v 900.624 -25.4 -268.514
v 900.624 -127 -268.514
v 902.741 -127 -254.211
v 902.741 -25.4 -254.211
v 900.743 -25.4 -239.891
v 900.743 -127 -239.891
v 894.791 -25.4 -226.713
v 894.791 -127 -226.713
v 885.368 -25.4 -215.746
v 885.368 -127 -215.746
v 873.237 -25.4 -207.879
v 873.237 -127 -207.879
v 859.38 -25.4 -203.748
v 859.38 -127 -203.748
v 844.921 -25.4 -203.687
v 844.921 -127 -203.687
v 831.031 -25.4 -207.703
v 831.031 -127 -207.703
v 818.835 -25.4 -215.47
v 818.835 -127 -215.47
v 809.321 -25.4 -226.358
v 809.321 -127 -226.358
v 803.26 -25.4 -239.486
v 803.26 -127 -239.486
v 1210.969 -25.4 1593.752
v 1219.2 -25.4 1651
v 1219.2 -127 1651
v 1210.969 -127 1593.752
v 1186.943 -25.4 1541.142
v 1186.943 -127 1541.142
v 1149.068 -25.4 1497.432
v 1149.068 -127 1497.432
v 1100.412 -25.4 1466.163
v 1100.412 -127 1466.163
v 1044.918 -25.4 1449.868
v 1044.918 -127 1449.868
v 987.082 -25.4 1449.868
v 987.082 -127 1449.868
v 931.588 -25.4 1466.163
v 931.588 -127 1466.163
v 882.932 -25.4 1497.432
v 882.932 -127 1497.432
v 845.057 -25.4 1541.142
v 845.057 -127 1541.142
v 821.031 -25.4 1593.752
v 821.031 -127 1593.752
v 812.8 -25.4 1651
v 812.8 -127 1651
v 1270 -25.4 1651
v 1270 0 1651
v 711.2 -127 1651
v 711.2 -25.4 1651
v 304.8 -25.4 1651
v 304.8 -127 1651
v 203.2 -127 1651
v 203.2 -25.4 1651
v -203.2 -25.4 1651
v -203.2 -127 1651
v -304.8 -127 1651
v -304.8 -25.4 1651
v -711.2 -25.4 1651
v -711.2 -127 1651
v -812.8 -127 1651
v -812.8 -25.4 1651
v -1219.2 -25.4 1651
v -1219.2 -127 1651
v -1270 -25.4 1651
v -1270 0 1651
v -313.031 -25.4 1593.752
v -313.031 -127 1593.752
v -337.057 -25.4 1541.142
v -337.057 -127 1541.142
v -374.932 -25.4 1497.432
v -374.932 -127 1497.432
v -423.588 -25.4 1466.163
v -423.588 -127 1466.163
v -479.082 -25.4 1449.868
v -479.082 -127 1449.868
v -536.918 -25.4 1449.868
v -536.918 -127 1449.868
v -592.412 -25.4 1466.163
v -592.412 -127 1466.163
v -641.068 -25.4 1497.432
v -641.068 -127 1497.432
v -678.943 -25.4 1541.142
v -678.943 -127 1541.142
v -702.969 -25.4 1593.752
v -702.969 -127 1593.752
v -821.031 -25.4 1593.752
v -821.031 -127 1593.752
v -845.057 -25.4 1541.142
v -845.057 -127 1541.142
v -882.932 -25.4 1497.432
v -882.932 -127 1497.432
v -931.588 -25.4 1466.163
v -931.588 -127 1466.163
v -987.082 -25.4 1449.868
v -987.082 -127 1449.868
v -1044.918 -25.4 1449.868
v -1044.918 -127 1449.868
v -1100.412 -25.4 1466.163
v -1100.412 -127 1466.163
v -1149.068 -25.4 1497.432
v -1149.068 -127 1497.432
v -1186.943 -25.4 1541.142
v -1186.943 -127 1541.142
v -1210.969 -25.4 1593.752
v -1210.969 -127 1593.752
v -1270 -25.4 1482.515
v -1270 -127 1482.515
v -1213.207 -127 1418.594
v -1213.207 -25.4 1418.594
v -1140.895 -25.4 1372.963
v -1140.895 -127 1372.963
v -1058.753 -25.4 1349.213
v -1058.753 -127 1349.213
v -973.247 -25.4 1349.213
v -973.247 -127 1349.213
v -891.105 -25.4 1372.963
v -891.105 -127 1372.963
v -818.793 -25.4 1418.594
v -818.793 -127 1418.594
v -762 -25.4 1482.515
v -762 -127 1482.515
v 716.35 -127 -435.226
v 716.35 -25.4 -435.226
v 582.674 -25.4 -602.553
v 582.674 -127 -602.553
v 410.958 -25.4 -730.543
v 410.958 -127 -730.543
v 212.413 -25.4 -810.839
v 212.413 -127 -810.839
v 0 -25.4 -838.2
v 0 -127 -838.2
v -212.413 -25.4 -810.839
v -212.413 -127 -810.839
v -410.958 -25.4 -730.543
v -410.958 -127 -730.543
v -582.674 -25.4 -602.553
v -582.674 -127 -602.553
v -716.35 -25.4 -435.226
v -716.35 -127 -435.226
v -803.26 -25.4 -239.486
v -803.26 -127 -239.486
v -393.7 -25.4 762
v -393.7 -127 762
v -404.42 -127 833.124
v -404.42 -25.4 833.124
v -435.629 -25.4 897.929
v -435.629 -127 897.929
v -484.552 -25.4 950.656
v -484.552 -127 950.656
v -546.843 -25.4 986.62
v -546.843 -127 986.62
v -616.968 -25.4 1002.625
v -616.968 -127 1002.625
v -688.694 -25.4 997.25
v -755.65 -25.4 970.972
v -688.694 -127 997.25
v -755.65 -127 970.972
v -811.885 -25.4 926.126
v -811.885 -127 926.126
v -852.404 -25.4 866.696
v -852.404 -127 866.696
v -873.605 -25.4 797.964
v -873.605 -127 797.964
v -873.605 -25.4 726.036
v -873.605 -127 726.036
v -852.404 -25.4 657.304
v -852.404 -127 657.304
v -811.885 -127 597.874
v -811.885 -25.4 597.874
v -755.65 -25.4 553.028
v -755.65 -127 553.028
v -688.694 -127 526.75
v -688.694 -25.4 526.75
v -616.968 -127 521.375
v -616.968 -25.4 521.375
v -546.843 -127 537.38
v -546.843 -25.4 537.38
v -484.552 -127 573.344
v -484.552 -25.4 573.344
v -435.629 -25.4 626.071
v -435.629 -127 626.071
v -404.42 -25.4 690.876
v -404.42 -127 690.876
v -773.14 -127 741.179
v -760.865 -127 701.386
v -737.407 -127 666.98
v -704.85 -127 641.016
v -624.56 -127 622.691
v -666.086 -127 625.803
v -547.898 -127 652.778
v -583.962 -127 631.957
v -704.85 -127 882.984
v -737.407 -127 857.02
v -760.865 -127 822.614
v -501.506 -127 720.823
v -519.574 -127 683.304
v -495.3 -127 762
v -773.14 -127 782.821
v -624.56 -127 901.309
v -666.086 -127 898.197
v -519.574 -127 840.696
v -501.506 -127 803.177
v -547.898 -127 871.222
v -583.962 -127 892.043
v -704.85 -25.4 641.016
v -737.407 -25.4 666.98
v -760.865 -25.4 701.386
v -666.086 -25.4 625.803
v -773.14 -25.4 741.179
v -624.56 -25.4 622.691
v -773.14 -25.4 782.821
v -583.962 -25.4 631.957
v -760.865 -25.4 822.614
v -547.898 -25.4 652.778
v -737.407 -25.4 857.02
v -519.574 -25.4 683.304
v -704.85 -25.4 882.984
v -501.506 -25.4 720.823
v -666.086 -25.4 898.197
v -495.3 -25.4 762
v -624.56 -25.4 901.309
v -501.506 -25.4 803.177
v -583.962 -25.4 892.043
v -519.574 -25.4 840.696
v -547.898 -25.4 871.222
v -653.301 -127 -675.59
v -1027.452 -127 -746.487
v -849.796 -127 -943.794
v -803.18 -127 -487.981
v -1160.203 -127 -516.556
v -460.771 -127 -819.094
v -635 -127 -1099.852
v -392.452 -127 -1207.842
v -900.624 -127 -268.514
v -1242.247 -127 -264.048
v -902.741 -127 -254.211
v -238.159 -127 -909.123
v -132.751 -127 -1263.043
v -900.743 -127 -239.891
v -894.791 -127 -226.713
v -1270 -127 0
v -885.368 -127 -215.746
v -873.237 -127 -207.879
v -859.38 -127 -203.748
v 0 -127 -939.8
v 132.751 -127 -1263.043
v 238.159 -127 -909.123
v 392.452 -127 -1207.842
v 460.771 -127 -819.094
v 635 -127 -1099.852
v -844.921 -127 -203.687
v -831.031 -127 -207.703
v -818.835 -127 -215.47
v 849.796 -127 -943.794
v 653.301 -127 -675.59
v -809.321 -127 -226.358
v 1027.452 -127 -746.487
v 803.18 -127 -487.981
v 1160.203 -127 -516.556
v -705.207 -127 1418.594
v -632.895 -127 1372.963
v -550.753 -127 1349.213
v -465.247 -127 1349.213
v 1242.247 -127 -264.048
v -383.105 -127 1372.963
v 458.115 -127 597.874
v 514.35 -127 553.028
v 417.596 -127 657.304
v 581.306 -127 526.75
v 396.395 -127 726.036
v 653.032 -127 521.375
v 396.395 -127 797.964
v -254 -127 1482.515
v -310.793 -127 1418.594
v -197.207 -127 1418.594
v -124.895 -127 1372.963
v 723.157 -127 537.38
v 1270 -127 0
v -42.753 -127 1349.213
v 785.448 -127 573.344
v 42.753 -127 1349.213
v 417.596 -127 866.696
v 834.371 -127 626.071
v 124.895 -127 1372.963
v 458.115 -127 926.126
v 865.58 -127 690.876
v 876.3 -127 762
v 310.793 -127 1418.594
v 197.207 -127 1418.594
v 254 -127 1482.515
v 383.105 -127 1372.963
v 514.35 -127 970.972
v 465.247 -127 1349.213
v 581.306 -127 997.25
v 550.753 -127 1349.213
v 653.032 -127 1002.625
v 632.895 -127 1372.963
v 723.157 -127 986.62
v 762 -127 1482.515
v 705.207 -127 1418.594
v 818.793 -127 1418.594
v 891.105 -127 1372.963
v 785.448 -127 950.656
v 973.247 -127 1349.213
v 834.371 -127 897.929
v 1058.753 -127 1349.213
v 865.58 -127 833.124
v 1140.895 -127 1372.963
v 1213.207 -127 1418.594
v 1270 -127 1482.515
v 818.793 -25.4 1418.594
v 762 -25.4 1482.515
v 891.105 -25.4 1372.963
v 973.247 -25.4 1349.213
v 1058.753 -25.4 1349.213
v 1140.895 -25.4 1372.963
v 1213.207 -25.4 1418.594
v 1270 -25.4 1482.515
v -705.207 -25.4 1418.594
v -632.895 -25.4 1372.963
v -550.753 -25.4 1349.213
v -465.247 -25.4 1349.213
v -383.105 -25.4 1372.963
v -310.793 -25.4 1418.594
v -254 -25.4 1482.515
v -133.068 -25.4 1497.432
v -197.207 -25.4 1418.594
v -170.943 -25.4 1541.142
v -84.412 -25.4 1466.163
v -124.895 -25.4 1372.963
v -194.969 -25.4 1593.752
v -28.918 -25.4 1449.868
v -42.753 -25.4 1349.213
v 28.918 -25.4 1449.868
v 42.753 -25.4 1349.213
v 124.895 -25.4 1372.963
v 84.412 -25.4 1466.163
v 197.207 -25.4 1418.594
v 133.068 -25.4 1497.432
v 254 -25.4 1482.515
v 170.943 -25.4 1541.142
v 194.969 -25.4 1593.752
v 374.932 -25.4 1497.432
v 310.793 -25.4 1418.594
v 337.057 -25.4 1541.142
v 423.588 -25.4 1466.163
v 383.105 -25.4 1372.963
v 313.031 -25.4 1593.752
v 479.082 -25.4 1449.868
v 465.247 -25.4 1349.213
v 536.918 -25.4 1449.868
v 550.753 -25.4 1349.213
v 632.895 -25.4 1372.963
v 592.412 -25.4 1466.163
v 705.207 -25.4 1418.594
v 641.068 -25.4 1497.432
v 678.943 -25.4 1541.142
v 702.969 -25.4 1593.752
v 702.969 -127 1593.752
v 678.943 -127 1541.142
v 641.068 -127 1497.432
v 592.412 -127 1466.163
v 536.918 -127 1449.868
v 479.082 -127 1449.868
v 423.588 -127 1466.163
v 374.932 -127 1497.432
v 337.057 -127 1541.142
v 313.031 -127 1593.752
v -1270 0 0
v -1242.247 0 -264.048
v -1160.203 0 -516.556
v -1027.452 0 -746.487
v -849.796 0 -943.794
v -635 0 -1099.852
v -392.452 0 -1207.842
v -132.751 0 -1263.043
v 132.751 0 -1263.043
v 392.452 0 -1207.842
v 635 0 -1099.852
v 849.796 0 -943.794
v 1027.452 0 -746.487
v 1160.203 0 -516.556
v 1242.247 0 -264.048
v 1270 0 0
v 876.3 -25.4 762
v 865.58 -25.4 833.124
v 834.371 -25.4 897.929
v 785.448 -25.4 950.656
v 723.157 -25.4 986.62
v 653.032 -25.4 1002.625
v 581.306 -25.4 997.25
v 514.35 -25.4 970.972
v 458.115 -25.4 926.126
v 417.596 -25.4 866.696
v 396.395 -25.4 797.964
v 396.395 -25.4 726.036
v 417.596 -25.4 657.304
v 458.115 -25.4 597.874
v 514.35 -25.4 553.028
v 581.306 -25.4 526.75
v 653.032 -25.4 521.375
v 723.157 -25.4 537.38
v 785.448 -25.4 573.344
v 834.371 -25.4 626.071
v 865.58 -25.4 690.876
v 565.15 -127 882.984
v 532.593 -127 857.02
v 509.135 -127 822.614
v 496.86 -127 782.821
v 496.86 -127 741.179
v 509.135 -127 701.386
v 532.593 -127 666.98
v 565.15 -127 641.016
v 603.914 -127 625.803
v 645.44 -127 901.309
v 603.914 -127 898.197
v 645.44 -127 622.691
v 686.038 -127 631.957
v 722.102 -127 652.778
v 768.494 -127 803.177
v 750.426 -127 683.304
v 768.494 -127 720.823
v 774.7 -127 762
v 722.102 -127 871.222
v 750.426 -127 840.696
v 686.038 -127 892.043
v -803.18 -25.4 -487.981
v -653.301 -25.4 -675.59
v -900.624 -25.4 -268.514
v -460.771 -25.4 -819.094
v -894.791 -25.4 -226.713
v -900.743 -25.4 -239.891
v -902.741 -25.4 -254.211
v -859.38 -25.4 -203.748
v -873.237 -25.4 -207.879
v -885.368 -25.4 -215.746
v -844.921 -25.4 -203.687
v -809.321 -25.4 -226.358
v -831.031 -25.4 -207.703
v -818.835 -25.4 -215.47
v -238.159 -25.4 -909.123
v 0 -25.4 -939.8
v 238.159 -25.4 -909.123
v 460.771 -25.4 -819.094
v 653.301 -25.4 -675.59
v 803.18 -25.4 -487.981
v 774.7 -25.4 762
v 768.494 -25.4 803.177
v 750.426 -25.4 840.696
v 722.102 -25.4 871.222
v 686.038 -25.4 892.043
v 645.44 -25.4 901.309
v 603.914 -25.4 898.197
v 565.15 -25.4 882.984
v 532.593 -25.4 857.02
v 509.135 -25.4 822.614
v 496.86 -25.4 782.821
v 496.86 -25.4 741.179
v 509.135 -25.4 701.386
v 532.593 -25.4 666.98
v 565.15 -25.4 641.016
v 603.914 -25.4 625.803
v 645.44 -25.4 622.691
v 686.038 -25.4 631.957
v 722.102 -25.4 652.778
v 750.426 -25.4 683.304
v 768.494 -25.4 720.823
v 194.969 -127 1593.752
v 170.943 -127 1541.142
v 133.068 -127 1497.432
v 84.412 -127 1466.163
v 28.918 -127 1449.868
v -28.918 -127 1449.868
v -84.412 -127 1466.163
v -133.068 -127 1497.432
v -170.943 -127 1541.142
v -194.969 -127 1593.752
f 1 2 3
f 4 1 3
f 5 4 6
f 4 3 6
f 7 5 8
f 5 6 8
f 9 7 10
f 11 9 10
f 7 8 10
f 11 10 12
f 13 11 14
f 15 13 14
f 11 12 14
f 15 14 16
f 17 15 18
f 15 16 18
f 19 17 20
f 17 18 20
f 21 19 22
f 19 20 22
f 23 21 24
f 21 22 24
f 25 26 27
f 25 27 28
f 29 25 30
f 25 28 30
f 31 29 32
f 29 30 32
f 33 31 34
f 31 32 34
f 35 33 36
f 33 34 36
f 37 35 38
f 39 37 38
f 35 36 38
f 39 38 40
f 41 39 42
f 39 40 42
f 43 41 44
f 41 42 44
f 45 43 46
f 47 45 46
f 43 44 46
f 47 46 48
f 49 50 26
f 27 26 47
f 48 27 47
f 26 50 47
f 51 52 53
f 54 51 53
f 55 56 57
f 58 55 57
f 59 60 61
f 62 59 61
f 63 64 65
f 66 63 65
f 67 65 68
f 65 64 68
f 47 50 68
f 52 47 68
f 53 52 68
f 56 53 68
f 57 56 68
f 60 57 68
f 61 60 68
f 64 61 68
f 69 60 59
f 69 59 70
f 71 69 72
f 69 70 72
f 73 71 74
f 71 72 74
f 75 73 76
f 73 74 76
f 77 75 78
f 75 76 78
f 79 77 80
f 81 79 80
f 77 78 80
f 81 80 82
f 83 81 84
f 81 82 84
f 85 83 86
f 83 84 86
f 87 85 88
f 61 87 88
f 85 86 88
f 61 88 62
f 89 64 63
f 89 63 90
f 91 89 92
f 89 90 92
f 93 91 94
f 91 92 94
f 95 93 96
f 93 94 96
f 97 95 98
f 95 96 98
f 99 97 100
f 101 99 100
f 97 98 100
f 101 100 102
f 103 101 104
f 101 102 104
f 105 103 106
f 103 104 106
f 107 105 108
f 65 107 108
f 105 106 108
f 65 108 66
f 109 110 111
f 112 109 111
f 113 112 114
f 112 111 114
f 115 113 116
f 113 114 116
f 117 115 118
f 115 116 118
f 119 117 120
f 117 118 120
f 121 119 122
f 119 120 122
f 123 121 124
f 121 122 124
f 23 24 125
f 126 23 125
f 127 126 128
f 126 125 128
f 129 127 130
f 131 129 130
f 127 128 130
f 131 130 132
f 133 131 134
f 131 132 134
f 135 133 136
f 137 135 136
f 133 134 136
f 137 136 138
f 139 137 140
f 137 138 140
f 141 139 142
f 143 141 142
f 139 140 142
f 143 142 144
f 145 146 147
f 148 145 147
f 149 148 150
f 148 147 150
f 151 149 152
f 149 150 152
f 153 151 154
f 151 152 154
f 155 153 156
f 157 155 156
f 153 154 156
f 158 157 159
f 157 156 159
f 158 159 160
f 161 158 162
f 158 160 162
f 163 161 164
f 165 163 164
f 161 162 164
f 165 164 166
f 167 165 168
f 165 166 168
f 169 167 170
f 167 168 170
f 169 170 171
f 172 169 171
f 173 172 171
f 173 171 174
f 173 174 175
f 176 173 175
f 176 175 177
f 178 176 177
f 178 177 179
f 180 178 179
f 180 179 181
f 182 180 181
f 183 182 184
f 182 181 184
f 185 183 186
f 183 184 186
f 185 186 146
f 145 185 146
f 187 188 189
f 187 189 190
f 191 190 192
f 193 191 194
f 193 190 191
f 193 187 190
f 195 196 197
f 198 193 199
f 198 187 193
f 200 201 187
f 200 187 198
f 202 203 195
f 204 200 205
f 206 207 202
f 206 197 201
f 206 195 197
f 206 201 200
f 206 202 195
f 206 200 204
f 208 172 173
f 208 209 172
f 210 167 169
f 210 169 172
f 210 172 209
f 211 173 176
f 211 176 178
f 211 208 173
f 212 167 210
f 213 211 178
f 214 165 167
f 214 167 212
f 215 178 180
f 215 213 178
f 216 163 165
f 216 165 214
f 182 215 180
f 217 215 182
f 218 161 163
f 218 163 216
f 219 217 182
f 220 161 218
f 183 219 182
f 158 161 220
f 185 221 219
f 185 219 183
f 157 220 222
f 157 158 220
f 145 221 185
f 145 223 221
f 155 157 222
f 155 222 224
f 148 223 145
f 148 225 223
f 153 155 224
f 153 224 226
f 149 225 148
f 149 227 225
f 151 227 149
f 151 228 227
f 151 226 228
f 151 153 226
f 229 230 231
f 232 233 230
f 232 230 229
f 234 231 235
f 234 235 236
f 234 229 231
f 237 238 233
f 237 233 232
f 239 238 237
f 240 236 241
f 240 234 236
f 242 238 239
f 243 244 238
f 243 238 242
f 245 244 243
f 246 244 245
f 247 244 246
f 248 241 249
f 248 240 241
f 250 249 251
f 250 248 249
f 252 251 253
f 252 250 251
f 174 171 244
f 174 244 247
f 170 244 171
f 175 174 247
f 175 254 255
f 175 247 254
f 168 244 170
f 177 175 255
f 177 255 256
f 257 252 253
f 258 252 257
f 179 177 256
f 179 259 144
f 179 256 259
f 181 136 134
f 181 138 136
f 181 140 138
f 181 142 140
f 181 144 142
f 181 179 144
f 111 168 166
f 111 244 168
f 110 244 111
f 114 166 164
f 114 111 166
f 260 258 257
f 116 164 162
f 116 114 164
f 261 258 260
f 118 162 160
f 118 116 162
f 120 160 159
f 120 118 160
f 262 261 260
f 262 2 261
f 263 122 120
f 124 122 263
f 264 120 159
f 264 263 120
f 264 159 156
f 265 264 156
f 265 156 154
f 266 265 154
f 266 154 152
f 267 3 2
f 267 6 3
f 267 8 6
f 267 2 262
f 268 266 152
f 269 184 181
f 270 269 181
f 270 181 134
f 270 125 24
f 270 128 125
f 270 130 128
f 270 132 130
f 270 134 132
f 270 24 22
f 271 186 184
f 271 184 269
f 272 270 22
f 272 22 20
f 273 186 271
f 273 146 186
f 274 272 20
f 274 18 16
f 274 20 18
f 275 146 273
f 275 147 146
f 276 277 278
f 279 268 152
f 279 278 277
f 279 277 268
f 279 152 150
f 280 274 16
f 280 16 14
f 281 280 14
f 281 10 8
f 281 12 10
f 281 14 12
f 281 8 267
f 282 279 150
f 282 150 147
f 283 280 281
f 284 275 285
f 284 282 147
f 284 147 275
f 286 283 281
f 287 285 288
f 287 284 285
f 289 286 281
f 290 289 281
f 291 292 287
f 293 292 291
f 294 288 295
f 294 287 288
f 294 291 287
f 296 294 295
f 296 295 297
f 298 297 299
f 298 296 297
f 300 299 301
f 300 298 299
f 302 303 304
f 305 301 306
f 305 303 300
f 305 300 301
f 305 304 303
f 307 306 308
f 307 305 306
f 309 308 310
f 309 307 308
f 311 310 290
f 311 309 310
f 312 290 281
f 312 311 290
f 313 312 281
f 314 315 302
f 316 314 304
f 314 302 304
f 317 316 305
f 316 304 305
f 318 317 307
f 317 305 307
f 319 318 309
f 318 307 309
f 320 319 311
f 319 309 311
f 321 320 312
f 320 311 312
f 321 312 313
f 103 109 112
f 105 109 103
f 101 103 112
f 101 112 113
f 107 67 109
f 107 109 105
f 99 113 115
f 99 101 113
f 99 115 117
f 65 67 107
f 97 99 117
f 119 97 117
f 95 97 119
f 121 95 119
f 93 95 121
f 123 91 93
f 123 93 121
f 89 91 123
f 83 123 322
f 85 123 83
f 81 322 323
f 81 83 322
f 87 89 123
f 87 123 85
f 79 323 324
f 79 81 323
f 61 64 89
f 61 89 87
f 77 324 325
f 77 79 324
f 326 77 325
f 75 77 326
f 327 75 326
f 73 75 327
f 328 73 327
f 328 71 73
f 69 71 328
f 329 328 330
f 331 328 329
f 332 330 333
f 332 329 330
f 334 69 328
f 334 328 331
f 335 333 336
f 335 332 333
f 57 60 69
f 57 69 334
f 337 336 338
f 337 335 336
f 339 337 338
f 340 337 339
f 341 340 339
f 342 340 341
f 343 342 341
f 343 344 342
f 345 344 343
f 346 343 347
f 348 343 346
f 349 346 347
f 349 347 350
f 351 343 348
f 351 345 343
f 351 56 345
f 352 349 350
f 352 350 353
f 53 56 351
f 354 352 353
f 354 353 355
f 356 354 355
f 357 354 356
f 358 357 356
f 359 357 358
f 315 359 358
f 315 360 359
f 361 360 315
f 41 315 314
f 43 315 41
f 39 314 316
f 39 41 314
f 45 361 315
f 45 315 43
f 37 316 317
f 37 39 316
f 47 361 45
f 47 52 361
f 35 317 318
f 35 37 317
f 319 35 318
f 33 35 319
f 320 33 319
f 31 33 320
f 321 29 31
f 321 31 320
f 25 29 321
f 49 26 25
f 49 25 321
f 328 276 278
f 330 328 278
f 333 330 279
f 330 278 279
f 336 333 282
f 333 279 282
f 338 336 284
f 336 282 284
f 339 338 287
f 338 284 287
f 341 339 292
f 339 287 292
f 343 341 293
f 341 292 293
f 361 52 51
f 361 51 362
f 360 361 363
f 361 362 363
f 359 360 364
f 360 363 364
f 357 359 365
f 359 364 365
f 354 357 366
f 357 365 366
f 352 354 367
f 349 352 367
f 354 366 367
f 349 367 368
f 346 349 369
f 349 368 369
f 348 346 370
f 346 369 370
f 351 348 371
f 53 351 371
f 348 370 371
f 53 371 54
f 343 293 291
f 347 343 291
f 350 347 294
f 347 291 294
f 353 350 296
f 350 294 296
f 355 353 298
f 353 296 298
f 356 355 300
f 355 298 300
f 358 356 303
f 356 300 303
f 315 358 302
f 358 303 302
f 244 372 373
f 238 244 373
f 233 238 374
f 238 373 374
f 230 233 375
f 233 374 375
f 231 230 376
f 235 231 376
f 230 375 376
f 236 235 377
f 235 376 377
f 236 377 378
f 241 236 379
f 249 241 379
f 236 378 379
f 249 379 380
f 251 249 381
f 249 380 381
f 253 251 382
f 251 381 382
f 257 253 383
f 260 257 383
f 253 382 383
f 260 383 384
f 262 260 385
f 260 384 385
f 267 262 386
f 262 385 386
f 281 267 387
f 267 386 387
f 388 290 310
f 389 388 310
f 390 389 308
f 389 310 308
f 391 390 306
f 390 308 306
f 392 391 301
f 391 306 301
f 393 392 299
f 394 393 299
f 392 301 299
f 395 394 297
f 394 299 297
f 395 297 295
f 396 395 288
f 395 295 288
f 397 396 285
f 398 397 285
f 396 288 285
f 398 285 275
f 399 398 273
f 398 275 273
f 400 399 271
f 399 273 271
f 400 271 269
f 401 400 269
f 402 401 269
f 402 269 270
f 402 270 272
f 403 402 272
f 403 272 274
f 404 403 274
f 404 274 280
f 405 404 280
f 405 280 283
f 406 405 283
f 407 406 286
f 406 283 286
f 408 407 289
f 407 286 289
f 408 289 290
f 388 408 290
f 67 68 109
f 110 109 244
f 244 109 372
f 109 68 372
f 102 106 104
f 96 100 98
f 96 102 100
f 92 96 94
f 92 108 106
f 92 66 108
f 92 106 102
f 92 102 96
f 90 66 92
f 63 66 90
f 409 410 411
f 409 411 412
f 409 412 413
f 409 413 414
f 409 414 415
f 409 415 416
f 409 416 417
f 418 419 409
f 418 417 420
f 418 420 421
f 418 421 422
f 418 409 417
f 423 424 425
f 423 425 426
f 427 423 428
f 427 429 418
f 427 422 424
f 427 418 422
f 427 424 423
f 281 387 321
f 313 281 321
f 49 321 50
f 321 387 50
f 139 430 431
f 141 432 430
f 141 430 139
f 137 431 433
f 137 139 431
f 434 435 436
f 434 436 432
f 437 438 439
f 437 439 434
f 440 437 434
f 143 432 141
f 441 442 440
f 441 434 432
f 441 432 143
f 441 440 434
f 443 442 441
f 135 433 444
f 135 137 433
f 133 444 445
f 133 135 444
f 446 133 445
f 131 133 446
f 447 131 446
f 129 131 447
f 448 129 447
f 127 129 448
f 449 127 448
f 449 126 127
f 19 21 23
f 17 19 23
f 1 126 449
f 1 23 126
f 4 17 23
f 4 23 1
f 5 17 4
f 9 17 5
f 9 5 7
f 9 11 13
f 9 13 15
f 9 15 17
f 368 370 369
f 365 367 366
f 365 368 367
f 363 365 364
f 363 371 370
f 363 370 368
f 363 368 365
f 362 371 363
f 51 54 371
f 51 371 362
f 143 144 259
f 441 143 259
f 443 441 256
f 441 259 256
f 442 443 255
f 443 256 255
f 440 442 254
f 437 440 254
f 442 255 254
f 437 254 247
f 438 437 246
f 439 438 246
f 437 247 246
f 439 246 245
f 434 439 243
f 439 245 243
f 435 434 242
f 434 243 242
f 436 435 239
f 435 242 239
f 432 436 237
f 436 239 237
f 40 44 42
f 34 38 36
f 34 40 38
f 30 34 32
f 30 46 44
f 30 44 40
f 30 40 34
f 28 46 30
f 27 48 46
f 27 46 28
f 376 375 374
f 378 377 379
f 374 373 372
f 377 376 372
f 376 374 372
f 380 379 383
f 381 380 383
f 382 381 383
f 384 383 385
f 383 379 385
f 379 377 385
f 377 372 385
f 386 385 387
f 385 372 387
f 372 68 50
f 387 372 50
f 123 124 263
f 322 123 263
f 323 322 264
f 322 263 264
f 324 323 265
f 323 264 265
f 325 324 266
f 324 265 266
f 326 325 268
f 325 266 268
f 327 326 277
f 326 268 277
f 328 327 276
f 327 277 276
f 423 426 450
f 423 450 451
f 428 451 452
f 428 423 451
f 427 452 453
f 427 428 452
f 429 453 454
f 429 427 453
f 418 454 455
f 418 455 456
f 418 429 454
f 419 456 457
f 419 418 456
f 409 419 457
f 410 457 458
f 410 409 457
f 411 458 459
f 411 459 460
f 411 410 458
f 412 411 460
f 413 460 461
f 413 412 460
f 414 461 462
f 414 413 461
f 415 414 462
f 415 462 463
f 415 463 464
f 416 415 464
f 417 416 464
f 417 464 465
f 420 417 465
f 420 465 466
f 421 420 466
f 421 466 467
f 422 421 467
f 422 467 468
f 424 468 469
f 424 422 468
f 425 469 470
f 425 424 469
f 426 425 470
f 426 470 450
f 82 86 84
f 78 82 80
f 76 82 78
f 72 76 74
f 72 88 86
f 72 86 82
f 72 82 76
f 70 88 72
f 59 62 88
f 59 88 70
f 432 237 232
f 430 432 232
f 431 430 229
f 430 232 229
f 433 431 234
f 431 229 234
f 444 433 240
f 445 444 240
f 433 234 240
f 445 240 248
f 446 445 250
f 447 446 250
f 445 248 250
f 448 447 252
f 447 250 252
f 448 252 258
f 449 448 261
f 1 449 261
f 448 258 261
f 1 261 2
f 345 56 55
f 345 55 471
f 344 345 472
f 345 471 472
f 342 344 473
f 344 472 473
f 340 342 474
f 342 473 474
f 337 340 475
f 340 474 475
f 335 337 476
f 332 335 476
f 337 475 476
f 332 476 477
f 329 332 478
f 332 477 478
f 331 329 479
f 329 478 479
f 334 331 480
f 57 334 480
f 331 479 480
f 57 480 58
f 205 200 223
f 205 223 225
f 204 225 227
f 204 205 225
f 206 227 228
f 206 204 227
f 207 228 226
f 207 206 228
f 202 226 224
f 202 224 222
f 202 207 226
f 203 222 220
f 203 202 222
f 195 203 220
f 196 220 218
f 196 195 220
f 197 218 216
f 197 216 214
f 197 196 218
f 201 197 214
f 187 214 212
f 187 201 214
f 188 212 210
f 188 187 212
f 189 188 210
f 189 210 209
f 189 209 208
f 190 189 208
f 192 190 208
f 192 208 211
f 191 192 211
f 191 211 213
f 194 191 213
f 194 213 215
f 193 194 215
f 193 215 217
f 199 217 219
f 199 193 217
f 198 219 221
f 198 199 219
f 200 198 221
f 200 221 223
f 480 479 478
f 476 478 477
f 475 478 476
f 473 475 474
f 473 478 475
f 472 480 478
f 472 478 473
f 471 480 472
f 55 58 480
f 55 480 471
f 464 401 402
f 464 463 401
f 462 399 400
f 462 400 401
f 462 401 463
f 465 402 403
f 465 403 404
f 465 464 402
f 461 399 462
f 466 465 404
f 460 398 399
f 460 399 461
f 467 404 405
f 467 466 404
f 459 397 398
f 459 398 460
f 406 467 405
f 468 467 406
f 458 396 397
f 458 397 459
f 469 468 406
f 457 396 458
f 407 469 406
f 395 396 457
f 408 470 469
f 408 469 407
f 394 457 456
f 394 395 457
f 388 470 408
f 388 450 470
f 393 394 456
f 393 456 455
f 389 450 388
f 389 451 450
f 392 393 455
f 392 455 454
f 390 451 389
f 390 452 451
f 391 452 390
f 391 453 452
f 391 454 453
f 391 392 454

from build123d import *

# Parameters (mm, degrees)
F1_DEPTH = 127
F2_R     = 241.3
F2_R_2   = 139.7
F3_DEPTH = 101.6
F4_R     = 139.7
F5_DEPTH = 101.6


with BuildPart() as f1:
    # F0 (on Front) → F1 (new body)
    with BuildSketch(Plane.XZ):
        with BuildLine():
            Line((-1270, 1651), (-1270, 0))
            ThreePointArc((-1270, 0), (0, -1270), (1270, 0))
            Line((1270, 0), (1270, 1651))
            Line((1270, 1651), (-1270, 1651))
        make_face()
    extrude(amount=F1_DEPTH)

    # F2 (on face) → F3 (cut)
    with BuildSketch(Plane.XZ.offset(127)):
        with BuildLine():
            ThreePointArc((-1219.2, 1651), (-1270, 1701.8), (-1320.8, 1651))
            ThreePointArc((-1320.8, 1651), (-1103.988181, 1359.176218), (-762, 1482.515461))
            ThreePointArc((-762, 1482.515461), (-799.823782, 1563.011819), (-812.8, 1651))
            ThreePointArc((-812.8, 1651), (-1016, 1447.8), (-1219.2, 1651))
        make_face()
        with BuildLine():
            ThreePointArc((-812.8, 1651), (-799.823782, 1563.011819), (-762, 1482.515461))
            ThreePointArc((-762, 1482.515461), (-724.176218, 1563.011819), (-711.2, 1651))
            ThreePointArc((-711.2, 1651), (-762, 1701.8), (-812.8, 1651))
        make_face()
        with BuildLine():
            ThreePointArc((-711.2, 1651), (-724.176218, 1563.011819), (-762, 1482.515461))
            ThreePointArc((-762, 1482.515461), (-508, 1346.2), (-254, 1482.515461))
            ThreePointArc((-254, 1482.515461), (-291.823782, 1563.011819), (-304.8, 1651))
            ThreePointArc((-304.8, 1651), (-508, 1447.8), (-711.2, 1651))
        make_face()
        with BuildLine():
            ThreePointArc((-304.8, 1651), (-291.823782, 1563.011819), (-254, 1482.515461))
            ThreePointArc((-254, 1482.515461), (-216.176218, 1563.011819), (-203.2, 1651))
            ThreePointArc((-203.2, 1651), (-254, 1701.8), (-304.8, 1651))
        make_face()
        with BuildLine():
            ThreePointArc((-203.2, 1651), (-216.176218, 1563.011819), (-254, 1482.515461))
            ThreePointArc((-254, 1482.515461), (0, 1346.2), (254, 1482.515461))
            ThreePointArc((254, 1482.515461), (216.176218, 1563.011819), (203.2, 1651))
            ThreePointArc((203.2, 1651), (0, 1447.8), (-203.2, 1651))
        make_face()
        with BuildLine():
            ThreePointArc((203.2, 1651), (216.176218, 1563.011819), (254, 1482.515461))
            ThreePointArc((254, 1482.515461), (291.823782, 1563.011819), (304.8, 1651))
            ThreePointArc((304.8, 1651), (254, 1701.8), (203.2, 1651))
        make_face()
        with BuildLine():
            ThreePointArc((304.8, 1651), (291.823782, 1563.011819), (254, 1482.515461))
            ThreePointArc((254, 1482.515461), (508, 1346.2), (762, 1482.515461))
            ThreePointArc((762, 1482.515461), (724.176218, 1563.011819), (711.2, 1651))
            ThreePointArc((711.2, 1651), (508, 1447.8), (304.8, 1651))
        make_face()
        with BuildLine():
            ThreePointArc((711.2, 1651), (724.176218, 1563.011819), (762, 1482.515461))
            ThreePointArc((762, 1482.515461), (799.823782, 1563.011819), (812.8, 1651))
            ThreePointArc((812.8, 1651), (762, 1701.8), (711.2, 1651))
        make_face()
        with BuildLine():
            ThreePointArc((812.8, 1651), (799.823782, 1563.011819), (762, 1482.515461))
            ThreePointArc((762, 1482.515461), (1103.988181, 1359.176218), (1320.8, 1651))
            ThreePointArc((1320.8, 1651), (1270, 1701.8), (1219.2, 1651))
            ThreePointArc((1219.2, 1651), (1016, 1447.8), (812.8, 1651))
        make_face()
        with BuildLine():
            ThreePointArc((-803.259505, -239.485714), (-866.456185, -205.317606), (-900.624294, -268.514286))
            ThreePointArc((-900.624294, -268.514286), (0, -939.8), (900.624294, -268.514286))
            ThreePointArc((900.624294, -268.514286), (866.456185, -205.317606), (803.259505, -239.485714))
            ThreePointArc((803.259505, -239.485714), (0, -838.2), (-803.259505, -239.485714))
        make_face()
        with Locations((-635, 762)):
            Circle(F2_R)
        with Locations((-635, 762)):
            Circle(F2_R_2, mode=Mode.SUBTRACT)
        with Locations((635, 762)):
            Circle(F2_R)
        with Locations((635, 762)):
            Circle(F2_R_2, mode=Mode.SUBTRACT)
    extrude(amount=-F3_DEPTH, mode=Mode.SUBTRACT)

    # F4 (on face) → F5 (join)
    with BuildSketch(Plane.XZ.offset(25.4)):
        with Locations((-635, 762)):
            Circle(F4_R)
    extrude(amount=F5_DEPTH)


solid = f1.part
